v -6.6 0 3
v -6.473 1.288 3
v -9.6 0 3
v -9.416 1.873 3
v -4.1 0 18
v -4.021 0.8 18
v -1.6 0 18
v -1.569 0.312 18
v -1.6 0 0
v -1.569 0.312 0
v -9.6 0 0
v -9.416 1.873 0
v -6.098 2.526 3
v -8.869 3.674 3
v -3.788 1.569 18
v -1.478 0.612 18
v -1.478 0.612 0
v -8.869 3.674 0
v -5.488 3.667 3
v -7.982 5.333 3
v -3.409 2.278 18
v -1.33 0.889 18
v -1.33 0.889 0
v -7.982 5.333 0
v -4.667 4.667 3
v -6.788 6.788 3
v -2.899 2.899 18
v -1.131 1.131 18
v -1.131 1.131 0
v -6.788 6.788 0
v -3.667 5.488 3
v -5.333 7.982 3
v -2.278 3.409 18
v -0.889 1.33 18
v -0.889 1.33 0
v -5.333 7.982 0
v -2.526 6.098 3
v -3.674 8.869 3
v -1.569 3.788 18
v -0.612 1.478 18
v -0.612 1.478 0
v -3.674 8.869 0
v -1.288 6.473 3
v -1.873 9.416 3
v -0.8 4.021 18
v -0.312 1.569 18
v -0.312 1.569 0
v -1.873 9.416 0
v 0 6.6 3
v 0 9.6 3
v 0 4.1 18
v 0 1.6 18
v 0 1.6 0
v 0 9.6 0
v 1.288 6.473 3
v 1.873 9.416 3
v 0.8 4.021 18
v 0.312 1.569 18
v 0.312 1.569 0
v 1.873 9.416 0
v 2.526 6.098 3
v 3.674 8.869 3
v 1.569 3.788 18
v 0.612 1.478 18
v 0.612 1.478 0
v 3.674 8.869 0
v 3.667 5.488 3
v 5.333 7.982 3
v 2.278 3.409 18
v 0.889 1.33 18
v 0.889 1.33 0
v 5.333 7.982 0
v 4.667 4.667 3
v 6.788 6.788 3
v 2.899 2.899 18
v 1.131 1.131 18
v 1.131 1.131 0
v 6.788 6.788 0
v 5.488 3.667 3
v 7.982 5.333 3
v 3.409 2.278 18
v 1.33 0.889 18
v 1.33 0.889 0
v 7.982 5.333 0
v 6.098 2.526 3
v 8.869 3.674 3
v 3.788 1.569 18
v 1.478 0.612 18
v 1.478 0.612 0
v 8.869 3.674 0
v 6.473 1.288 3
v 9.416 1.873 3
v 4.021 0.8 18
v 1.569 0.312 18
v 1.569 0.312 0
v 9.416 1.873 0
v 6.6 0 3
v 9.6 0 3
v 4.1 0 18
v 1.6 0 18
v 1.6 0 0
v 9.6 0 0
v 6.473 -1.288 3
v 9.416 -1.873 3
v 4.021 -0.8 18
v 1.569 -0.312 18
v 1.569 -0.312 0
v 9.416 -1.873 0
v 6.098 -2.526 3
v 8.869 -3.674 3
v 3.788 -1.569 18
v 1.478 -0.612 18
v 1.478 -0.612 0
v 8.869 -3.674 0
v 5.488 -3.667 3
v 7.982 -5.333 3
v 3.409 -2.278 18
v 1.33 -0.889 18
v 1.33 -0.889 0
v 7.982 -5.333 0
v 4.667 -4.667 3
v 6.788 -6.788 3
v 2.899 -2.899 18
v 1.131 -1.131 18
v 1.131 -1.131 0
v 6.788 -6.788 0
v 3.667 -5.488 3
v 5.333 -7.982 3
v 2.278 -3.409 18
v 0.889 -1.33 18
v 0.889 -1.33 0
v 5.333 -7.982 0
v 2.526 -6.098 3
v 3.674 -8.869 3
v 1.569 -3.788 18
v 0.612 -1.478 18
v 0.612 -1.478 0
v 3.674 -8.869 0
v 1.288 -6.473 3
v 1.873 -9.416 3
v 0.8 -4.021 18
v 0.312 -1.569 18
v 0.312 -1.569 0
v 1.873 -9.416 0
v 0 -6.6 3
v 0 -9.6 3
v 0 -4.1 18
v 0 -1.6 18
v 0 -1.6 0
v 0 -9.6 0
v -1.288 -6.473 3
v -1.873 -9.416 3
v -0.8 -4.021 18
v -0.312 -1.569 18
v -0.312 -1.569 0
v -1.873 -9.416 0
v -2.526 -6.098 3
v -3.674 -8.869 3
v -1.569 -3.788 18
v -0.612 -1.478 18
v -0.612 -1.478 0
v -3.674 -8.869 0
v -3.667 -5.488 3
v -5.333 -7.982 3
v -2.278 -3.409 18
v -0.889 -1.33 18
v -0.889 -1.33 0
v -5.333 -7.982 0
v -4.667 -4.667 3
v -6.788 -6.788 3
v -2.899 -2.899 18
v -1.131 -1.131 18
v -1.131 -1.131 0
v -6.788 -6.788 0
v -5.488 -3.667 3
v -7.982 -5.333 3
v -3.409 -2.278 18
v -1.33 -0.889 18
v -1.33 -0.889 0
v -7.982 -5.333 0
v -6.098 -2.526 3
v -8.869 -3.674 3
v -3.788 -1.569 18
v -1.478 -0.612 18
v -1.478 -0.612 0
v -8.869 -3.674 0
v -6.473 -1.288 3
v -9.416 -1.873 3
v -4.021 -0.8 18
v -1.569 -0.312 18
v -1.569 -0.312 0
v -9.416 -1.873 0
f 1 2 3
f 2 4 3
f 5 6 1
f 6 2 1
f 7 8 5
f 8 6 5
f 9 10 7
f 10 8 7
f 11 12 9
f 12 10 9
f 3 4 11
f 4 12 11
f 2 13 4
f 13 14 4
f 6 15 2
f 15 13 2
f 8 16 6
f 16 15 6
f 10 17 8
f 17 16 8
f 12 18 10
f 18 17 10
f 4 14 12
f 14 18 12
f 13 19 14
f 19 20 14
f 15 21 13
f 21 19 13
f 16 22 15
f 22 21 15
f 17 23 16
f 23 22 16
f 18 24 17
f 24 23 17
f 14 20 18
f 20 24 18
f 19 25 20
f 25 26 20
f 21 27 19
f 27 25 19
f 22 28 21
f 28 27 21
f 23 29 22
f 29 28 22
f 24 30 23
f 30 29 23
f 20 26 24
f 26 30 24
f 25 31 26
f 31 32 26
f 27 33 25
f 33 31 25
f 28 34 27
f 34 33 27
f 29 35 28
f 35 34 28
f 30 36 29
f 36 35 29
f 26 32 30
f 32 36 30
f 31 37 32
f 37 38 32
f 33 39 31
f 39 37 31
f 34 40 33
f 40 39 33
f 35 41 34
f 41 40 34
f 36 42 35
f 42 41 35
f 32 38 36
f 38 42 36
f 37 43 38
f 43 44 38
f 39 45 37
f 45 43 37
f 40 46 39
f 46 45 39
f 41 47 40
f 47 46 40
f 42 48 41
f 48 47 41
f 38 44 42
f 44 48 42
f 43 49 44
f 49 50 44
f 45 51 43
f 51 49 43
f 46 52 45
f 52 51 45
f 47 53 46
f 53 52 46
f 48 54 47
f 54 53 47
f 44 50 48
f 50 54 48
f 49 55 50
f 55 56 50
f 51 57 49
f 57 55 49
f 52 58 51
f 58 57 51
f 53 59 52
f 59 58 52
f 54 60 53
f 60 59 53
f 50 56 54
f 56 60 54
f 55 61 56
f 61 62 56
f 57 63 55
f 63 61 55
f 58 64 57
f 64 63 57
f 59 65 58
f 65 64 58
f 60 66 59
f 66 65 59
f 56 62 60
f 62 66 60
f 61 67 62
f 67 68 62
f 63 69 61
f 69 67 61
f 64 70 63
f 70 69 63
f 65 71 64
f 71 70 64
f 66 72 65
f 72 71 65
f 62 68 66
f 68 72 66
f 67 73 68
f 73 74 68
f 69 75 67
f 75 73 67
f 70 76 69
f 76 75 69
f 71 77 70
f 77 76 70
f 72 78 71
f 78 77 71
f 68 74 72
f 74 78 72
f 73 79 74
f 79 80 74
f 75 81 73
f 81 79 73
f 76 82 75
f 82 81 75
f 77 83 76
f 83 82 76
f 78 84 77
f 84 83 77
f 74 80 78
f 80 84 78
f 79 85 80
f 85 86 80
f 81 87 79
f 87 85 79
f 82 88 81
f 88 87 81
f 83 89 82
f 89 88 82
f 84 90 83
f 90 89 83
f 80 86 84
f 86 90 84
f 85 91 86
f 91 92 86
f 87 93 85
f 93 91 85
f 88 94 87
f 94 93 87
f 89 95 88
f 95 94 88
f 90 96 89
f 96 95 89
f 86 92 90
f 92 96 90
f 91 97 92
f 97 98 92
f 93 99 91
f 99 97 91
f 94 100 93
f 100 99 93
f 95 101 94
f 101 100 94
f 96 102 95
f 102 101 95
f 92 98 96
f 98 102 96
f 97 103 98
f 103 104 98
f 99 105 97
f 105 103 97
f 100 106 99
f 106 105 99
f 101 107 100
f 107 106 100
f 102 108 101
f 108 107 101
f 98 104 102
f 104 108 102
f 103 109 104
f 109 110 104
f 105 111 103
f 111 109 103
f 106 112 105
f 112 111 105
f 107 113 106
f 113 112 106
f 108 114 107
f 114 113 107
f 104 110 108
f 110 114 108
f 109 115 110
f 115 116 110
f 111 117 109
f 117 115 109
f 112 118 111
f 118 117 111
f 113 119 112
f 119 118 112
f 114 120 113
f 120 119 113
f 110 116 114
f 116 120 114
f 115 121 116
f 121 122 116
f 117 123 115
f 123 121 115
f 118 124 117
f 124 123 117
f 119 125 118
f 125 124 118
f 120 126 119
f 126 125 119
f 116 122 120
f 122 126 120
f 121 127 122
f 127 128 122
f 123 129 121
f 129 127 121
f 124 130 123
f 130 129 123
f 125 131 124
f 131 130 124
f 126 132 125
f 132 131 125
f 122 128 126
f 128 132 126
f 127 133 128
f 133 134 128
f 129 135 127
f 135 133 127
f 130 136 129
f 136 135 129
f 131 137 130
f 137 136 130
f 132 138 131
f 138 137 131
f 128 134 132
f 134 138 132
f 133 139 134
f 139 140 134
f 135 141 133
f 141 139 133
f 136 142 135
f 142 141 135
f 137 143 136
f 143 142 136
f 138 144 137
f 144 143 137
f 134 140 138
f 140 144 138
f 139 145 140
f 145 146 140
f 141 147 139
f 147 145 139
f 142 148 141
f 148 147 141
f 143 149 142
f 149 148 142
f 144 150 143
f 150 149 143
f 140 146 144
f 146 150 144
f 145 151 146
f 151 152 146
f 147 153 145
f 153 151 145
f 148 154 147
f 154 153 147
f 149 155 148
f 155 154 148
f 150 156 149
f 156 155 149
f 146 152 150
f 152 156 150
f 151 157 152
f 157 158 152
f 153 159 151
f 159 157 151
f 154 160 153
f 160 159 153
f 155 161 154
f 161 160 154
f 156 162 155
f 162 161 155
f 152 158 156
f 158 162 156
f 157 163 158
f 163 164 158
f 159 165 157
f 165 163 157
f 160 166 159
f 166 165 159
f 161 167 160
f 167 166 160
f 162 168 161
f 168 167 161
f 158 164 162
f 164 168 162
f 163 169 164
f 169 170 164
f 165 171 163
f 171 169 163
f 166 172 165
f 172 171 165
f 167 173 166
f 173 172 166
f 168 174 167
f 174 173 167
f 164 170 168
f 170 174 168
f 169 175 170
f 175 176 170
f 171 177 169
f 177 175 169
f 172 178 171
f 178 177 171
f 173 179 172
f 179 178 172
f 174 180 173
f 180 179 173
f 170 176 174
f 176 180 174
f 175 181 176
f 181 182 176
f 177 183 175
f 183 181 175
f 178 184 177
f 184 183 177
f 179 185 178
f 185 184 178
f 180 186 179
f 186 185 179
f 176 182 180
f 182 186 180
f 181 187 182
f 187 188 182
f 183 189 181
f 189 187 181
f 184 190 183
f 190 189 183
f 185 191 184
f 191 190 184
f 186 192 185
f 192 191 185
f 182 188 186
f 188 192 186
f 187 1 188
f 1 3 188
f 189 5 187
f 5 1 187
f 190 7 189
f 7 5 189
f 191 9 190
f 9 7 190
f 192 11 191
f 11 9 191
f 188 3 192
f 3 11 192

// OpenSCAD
$fn = 32;

// ----------------------------------------------------------------------
// Profiled standoff: conical spacer, 18 mm long, bore 3.2 mm
// ----------------------------------------------------------------------

// --- parameters (mm) ---
revolve_angle = 360;      // full turn around the Z axis
profile_points = 6;       // points of the closed outline

profile = [[1.6, 0], [9.6, 0], [9.6, 3], [6.6, 3], [4.1, 18], [1.6, 18]];  // single closed polygon, 6 points, counter clockwise

// --- the one profile operation ---
rotate_extrude(angle = revolve_angle) polygon(points = profile);
